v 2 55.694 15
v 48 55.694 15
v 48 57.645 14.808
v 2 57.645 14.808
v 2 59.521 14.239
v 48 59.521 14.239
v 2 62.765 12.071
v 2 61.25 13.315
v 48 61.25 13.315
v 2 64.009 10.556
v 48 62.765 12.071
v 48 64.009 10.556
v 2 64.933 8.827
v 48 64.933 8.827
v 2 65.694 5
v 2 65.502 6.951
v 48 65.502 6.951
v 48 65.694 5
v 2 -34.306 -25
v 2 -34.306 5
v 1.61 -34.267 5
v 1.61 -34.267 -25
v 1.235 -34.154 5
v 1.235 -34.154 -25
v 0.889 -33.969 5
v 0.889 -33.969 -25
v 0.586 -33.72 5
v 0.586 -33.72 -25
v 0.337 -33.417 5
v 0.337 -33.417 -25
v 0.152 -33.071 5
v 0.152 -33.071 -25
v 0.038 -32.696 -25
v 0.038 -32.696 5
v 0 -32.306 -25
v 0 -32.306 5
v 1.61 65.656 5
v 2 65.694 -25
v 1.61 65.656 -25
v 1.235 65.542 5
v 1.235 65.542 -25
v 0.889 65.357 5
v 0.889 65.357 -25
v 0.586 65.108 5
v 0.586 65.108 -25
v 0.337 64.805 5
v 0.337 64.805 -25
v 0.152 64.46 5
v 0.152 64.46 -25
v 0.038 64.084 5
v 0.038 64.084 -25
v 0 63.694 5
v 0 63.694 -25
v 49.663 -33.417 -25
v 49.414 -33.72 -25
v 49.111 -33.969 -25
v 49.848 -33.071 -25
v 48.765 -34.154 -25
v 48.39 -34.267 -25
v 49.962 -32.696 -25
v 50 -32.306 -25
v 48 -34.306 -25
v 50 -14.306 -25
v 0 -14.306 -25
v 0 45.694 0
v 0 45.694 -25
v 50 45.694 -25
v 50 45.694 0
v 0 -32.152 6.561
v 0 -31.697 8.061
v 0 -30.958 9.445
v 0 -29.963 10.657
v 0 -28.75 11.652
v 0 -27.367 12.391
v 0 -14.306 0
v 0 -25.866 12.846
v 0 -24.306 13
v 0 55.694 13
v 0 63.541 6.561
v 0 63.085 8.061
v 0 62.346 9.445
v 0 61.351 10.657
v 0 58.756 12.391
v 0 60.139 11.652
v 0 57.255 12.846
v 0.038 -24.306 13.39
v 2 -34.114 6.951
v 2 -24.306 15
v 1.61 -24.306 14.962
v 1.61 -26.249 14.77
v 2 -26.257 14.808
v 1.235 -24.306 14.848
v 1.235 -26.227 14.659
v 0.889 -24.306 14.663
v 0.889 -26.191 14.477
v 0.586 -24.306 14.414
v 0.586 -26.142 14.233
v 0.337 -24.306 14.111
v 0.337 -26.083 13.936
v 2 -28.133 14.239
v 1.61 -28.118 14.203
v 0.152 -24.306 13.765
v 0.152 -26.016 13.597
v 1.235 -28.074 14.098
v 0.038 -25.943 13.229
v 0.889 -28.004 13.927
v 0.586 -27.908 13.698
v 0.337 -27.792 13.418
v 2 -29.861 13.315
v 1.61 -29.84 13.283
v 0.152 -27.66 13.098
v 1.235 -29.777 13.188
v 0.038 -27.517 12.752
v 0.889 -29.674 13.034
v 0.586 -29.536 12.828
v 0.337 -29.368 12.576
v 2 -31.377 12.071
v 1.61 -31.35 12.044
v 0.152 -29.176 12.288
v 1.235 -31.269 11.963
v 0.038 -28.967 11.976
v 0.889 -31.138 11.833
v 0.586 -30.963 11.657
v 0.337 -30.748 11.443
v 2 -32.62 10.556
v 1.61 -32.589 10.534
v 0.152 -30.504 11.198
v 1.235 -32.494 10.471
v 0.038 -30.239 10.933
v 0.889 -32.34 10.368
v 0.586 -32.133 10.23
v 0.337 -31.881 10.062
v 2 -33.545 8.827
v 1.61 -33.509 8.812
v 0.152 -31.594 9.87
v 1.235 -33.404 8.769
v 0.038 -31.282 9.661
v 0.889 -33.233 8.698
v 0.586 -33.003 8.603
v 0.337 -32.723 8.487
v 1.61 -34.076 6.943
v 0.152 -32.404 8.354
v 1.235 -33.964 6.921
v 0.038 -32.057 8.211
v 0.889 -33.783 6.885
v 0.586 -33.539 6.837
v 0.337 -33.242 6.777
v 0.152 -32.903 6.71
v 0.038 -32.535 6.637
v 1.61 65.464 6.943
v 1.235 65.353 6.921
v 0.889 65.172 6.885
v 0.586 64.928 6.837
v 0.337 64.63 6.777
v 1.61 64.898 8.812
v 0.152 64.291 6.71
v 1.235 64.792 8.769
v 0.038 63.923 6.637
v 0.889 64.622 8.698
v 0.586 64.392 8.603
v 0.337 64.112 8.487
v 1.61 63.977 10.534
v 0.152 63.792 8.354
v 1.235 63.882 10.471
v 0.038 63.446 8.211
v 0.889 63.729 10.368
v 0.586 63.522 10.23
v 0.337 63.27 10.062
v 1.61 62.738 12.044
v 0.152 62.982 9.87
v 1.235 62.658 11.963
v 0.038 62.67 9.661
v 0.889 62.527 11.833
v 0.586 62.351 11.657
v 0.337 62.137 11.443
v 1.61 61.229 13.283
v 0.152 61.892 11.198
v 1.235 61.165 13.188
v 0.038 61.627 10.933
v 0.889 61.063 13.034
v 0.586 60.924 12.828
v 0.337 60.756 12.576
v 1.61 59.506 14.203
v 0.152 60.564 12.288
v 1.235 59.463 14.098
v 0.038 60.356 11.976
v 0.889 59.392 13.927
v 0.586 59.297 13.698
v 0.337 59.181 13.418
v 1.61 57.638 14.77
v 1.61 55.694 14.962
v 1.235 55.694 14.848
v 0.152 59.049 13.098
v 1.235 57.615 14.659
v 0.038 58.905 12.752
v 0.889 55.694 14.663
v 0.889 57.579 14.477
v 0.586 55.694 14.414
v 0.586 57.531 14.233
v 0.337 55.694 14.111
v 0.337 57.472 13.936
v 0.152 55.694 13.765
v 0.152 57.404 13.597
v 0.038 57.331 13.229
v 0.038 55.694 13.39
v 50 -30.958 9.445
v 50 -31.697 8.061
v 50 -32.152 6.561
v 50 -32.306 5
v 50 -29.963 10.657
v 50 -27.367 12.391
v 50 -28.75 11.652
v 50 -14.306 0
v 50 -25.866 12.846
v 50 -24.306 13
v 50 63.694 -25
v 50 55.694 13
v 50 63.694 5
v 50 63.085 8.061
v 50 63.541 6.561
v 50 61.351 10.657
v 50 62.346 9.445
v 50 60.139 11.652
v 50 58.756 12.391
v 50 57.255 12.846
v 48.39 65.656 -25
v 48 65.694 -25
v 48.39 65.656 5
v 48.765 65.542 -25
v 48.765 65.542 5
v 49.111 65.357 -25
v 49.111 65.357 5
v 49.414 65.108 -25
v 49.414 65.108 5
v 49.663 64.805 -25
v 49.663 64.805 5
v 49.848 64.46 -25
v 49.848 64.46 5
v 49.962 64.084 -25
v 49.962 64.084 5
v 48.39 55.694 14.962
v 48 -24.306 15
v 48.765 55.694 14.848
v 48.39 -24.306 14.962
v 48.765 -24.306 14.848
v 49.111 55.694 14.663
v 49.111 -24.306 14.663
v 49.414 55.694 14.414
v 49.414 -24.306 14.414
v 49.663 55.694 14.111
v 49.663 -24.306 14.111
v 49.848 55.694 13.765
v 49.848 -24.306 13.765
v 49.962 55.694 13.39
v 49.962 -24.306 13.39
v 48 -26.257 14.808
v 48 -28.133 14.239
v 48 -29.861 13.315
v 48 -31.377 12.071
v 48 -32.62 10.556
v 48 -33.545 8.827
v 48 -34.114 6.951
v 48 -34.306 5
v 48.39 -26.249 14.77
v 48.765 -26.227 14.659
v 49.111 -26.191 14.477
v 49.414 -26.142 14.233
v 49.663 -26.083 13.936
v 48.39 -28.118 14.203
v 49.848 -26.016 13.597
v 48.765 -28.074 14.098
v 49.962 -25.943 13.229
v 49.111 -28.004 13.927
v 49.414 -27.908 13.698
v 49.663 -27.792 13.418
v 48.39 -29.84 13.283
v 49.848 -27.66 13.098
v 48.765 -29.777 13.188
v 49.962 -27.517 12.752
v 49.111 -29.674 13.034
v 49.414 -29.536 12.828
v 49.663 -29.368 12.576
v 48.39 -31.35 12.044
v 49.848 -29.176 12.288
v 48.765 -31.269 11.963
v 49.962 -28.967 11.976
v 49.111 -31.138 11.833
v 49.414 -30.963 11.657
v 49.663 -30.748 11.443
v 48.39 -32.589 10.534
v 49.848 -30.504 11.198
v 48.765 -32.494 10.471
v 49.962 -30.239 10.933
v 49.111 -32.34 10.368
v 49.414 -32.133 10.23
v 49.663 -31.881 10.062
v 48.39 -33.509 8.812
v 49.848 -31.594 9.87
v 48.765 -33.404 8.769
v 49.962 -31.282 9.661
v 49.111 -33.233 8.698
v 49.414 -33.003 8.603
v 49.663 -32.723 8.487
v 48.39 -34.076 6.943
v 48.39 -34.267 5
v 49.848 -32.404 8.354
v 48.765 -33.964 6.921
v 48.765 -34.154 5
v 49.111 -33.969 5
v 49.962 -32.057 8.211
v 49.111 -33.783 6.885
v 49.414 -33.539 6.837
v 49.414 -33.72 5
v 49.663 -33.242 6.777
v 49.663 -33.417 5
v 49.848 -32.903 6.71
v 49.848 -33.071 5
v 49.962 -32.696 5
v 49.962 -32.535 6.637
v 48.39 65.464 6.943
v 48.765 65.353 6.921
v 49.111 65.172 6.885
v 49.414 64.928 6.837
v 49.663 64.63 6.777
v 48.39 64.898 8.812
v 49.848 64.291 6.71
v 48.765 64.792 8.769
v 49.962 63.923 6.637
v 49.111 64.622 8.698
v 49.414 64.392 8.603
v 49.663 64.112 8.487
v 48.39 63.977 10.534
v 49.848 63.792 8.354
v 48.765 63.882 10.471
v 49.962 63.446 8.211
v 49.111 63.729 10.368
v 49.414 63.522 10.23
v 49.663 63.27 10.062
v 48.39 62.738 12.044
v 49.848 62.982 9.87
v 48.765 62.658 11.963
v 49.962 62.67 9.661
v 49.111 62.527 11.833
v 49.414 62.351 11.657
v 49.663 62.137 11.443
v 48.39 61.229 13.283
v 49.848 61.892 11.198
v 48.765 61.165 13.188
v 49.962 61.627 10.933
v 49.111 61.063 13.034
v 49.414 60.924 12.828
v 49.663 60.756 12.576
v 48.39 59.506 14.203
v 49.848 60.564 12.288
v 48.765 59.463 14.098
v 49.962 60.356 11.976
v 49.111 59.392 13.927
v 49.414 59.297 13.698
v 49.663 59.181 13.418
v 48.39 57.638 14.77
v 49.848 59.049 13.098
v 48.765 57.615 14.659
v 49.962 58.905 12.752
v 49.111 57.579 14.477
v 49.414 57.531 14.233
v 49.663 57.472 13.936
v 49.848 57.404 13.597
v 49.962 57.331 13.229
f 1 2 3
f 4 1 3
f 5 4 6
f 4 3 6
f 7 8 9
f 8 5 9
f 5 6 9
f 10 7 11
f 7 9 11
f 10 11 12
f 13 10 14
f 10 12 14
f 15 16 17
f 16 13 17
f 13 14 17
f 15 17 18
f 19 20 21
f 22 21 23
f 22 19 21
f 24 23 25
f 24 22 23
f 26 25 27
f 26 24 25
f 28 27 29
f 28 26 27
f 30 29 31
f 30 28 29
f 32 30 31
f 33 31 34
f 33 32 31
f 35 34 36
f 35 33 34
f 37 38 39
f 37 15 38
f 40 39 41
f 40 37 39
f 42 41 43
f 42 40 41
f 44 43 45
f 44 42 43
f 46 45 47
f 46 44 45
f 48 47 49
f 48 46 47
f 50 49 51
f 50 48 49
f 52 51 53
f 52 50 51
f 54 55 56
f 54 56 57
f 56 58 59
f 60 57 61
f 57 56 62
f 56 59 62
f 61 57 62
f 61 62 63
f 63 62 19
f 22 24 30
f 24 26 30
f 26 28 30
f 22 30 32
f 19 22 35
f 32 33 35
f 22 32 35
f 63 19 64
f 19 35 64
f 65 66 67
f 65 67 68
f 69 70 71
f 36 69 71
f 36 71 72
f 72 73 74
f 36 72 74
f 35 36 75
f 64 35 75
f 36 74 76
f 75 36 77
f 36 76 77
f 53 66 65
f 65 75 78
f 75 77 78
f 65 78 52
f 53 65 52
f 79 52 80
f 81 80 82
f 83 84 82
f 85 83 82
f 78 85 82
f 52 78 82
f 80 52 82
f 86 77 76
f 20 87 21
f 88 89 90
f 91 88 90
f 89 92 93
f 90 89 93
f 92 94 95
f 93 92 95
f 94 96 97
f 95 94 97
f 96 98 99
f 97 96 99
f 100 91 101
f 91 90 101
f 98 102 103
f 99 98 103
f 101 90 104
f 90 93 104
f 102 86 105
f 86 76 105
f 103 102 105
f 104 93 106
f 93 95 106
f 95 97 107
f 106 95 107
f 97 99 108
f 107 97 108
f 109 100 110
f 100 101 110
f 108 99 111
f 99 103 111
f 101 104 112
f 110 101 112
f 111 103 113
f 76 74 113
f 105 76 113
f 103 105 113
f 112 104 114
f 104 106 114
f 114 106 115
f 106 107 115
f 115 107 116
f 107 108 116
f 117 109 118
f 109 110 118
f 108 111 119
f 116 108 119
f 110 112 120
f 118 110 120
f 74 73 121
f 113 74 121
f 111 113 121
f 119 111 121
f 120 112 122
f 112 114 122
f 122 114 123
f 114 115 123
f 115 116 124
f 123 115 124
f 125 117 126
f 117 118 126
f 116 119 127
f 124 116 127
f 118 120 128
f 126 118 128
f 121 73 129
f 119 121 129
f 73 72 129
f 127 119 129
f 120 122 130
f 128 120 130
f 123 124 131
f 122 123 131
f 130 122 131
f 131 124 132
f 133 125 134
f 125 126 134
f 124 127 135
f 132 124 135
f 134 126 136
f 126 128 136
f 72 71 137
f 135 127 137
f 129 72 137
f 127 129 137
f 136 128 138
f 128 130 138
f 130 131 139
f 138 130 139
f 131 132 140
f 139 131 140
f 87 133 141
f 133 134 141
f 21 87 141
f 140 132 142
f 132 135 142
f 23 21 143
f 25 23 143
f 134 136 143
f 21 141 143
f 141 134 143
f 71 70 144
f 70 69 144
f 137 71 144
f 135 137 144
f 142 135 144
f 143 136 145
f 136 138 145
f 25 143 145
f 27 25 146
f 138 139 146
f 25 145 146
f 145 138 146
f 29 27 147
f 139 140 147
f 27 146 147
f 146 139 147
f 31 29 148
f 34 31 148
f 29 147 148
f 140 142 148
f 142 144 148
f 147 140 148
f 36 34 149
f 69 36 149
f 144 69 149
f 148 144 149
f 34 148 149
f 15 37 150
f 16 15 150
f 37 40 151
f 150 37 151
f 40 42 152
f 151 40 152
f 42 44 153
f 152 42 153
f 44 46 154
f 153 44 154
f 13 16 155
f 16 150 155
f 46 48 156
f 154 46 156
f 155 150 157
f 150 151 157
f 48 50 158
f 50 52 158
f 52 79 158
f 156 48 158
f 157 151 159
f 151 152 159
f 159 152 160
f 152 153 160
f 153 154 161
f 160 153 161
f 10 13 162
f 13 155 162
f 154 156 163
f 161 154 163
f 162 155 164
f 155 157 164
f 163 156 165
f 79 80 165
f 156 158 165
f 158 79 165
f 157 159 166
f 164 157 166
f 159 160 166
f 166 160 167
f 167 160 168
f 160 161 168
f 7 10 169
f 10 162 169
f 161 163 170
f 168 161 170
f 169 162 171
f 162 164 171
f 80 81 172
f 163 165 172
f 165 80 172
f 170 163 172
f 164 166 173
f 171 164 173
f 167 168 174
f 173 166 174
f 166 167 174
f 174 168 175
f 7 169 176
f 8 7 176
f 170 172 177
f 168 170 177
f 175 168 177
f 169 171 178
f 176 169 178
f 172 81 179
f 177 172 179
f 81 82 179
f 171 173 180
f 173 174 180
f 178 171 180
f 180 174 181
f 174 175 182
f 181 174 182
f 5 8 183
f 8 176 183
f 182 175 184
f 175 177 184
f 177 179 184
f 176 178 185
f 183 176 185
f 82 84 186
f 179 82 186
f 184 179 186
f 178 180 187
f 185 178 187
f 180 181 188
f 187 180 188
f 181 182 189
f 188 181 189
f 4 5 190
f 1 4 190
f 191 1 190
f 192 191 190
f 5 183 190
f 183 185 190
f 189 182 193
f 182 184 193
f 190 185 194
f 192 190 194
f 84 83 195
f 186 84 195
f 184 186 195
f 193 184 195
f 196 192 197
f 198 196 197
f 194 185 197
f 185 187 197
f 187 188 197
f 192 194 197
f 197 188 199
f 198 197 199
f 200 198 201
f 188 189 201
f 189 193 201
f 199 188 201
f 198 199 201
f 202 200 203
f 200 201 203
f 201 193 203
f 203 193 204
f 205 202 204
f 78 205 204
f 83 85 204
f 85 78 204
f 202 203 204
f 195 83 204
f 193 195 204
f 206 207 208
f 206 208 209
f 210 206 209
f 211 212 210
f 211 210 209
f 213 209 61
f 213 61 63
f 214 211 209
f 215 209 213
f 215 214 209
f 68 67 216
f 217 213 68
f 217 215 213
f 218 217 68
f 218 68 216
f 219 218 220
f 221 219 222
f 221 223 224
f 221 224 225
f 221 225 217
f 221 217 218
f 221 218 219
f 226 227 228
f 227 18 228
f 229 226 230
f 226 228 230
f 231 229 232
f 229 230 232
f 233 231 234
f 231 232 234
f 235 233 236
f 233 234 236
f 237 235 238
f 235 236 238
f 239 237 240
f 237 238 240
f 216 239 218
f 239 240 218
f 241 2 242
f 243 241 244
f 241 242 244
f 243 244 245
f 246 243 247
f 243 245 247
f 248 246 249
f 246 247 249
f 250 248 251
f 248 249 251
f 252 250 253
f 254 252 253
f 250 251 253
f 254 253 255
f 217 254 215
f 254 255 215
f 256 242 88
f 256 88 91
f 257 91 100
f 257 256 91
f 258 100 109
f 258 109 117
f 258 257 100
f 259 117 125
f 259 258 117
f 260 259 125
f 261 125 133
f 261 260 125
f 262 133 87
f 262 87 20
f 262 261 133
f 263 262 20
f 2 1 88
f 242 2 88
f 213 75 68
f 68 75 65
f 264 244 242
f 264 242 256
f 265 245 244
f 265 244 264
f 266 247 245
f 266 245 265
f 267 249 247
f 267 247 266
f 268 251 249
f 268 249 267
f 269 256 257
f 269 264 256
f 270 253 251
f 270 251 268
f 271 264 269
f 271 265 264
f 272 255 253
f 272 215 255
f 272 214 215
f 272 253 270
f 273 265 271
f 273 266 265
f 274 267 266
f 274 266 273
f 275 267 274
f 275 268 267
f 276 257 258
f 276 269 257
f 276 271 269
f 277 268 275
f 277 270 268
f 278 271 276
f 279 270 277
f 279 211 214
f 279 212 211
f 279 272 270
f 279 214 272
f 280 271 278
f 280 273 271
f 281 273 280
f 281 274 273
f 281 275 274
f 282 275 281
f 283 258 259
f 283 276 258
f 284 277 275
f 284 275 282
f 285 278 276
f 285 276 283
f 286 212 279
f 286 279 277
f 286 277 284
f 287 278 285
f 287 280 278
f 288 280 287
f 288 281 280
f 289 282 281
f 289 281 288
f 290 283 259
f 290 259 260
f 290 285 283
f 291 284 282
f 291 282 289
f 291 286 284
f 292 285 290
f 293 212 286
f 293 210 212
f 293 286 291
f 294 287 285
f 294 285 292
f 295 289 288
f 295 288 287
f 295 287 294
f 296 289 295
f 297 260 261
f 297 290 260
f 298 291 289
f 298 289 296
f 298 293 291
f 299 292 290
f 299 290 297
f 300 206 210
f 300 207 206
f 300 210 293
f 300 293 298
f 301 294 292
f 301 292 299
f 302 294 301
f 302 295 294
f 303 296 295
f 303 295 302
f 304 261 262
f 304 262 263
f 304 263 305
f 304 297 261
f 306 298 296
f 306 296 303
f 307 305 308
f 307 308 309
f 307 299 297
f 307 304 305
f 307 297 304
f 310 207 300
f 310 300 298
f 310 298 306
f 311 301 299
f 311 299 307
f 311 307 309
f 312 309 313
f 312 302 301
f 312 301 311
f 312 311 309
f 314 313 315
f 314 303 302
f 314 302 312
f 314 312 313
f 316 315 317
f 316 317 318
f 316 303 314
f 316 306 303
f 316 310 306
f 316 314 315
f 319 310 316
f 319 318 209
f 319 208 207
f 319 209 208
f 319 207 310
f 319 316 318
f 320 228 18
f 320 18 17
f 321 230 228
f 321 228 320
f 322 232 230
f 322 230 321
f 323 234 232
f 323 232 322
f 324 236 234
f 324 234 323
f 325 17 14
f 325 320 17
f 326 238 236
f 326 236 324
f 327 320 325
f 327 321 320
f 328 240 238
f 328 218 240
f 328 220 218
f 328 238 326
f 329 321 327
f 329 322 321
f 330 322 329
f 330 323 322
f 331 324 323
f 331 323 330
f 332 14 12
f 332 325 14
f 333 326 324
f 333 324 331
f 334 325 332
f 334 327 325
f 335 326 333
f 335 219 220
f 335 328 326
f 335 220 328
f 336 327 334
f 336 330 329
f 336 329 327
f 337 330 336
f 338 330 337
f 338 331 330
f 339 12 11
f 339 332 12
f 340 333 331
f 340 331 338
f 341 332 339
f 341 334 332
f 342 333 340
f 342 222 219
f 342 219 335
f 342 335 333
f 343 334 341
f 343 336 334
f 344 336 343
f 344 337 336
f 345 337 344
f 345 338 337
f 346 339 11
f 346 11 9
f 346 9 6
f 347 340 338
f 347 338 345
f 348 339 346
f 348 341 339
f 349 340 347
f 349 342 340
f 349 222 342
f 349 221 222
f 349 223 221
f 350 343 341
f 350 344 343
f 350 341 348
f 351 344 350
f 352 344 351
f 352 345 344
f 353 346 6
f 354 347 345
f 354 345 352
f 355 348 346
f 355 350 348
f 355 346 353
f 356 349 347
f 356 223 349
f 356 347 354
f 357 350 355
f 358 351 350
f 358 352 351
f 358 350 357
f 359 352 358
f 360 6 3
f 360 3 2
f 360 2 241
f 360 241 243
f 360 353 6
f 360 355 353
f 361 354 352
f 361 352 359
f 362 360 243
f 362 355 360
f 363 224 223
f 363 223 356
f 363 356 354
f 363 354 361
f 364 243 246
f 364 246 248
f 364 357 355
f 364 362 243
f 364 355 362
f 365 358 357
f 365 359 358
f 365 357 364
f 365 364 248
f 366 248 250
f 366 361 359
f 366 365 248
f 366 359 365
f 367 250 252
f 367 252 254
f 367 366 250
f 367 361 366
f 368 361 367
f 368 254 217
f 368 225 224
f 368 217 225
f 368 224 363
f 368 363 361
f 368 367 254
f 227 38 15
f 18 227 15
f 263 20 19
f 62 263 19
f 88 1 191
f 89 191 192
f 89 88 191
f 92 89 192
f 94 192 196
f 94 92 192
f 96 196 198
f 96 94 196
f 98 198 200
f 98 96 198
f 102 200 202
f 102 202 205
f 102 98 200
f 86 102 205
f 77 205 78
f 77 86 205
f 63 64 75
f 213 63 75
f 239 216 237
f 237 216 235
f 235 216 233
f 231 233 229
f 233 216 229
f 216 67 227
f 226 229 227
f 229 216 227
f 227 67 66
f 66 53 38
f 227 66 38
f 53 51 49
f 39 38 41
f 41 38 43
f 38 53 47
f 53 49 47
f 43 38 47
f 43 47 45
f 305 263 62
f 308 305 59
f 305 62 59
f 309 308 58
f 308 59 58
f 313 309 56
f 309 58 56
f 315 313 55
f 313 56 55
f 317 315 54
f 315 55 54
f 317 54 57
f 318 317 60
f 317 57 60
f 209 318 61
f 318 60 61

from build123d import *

# Parameters (mm, degrees)
F0_W     = 20
F0_H     = 25
F1_DEPTH = 50
F2_R     = 10
F3_R     = 2


with BuildPart() as f1:
    # F0 (on Right) → F1 (new body)
    with BuildSketch(Plane.YZ):
        Polygon((65.694234, 15), (-34.305766, 15), (-34.305766, 0), (-14.305766, 0), (45.694234, 0), (65.694234, 0), align=None)
        with Locations((-24.305766, -12.5)):
            Rectangle(F0_W, F0_H)
        with Locations((55.694234, -12.5)):
            Rectangle(F0_W, F0_H)
    extrude(amount=F1_DEPTH)

    # F2
    f2_edges = [f1.edges().sort_by_distance(p)[0] for p in [
        (25, -34.305766, 15),
        (25, 65.694234, 15),
    ]]
    fillet(f2_edges, radius=F2_R)

    # F3
    f3_edges = [f1.edges().sort_by_distance(p)[0] for p in [
        (50, 15.694234, 15),
        (0, 15.694234, 15),
    ]]
    fillet(f3_edges, radius=F3_R)


solid = f1.part
